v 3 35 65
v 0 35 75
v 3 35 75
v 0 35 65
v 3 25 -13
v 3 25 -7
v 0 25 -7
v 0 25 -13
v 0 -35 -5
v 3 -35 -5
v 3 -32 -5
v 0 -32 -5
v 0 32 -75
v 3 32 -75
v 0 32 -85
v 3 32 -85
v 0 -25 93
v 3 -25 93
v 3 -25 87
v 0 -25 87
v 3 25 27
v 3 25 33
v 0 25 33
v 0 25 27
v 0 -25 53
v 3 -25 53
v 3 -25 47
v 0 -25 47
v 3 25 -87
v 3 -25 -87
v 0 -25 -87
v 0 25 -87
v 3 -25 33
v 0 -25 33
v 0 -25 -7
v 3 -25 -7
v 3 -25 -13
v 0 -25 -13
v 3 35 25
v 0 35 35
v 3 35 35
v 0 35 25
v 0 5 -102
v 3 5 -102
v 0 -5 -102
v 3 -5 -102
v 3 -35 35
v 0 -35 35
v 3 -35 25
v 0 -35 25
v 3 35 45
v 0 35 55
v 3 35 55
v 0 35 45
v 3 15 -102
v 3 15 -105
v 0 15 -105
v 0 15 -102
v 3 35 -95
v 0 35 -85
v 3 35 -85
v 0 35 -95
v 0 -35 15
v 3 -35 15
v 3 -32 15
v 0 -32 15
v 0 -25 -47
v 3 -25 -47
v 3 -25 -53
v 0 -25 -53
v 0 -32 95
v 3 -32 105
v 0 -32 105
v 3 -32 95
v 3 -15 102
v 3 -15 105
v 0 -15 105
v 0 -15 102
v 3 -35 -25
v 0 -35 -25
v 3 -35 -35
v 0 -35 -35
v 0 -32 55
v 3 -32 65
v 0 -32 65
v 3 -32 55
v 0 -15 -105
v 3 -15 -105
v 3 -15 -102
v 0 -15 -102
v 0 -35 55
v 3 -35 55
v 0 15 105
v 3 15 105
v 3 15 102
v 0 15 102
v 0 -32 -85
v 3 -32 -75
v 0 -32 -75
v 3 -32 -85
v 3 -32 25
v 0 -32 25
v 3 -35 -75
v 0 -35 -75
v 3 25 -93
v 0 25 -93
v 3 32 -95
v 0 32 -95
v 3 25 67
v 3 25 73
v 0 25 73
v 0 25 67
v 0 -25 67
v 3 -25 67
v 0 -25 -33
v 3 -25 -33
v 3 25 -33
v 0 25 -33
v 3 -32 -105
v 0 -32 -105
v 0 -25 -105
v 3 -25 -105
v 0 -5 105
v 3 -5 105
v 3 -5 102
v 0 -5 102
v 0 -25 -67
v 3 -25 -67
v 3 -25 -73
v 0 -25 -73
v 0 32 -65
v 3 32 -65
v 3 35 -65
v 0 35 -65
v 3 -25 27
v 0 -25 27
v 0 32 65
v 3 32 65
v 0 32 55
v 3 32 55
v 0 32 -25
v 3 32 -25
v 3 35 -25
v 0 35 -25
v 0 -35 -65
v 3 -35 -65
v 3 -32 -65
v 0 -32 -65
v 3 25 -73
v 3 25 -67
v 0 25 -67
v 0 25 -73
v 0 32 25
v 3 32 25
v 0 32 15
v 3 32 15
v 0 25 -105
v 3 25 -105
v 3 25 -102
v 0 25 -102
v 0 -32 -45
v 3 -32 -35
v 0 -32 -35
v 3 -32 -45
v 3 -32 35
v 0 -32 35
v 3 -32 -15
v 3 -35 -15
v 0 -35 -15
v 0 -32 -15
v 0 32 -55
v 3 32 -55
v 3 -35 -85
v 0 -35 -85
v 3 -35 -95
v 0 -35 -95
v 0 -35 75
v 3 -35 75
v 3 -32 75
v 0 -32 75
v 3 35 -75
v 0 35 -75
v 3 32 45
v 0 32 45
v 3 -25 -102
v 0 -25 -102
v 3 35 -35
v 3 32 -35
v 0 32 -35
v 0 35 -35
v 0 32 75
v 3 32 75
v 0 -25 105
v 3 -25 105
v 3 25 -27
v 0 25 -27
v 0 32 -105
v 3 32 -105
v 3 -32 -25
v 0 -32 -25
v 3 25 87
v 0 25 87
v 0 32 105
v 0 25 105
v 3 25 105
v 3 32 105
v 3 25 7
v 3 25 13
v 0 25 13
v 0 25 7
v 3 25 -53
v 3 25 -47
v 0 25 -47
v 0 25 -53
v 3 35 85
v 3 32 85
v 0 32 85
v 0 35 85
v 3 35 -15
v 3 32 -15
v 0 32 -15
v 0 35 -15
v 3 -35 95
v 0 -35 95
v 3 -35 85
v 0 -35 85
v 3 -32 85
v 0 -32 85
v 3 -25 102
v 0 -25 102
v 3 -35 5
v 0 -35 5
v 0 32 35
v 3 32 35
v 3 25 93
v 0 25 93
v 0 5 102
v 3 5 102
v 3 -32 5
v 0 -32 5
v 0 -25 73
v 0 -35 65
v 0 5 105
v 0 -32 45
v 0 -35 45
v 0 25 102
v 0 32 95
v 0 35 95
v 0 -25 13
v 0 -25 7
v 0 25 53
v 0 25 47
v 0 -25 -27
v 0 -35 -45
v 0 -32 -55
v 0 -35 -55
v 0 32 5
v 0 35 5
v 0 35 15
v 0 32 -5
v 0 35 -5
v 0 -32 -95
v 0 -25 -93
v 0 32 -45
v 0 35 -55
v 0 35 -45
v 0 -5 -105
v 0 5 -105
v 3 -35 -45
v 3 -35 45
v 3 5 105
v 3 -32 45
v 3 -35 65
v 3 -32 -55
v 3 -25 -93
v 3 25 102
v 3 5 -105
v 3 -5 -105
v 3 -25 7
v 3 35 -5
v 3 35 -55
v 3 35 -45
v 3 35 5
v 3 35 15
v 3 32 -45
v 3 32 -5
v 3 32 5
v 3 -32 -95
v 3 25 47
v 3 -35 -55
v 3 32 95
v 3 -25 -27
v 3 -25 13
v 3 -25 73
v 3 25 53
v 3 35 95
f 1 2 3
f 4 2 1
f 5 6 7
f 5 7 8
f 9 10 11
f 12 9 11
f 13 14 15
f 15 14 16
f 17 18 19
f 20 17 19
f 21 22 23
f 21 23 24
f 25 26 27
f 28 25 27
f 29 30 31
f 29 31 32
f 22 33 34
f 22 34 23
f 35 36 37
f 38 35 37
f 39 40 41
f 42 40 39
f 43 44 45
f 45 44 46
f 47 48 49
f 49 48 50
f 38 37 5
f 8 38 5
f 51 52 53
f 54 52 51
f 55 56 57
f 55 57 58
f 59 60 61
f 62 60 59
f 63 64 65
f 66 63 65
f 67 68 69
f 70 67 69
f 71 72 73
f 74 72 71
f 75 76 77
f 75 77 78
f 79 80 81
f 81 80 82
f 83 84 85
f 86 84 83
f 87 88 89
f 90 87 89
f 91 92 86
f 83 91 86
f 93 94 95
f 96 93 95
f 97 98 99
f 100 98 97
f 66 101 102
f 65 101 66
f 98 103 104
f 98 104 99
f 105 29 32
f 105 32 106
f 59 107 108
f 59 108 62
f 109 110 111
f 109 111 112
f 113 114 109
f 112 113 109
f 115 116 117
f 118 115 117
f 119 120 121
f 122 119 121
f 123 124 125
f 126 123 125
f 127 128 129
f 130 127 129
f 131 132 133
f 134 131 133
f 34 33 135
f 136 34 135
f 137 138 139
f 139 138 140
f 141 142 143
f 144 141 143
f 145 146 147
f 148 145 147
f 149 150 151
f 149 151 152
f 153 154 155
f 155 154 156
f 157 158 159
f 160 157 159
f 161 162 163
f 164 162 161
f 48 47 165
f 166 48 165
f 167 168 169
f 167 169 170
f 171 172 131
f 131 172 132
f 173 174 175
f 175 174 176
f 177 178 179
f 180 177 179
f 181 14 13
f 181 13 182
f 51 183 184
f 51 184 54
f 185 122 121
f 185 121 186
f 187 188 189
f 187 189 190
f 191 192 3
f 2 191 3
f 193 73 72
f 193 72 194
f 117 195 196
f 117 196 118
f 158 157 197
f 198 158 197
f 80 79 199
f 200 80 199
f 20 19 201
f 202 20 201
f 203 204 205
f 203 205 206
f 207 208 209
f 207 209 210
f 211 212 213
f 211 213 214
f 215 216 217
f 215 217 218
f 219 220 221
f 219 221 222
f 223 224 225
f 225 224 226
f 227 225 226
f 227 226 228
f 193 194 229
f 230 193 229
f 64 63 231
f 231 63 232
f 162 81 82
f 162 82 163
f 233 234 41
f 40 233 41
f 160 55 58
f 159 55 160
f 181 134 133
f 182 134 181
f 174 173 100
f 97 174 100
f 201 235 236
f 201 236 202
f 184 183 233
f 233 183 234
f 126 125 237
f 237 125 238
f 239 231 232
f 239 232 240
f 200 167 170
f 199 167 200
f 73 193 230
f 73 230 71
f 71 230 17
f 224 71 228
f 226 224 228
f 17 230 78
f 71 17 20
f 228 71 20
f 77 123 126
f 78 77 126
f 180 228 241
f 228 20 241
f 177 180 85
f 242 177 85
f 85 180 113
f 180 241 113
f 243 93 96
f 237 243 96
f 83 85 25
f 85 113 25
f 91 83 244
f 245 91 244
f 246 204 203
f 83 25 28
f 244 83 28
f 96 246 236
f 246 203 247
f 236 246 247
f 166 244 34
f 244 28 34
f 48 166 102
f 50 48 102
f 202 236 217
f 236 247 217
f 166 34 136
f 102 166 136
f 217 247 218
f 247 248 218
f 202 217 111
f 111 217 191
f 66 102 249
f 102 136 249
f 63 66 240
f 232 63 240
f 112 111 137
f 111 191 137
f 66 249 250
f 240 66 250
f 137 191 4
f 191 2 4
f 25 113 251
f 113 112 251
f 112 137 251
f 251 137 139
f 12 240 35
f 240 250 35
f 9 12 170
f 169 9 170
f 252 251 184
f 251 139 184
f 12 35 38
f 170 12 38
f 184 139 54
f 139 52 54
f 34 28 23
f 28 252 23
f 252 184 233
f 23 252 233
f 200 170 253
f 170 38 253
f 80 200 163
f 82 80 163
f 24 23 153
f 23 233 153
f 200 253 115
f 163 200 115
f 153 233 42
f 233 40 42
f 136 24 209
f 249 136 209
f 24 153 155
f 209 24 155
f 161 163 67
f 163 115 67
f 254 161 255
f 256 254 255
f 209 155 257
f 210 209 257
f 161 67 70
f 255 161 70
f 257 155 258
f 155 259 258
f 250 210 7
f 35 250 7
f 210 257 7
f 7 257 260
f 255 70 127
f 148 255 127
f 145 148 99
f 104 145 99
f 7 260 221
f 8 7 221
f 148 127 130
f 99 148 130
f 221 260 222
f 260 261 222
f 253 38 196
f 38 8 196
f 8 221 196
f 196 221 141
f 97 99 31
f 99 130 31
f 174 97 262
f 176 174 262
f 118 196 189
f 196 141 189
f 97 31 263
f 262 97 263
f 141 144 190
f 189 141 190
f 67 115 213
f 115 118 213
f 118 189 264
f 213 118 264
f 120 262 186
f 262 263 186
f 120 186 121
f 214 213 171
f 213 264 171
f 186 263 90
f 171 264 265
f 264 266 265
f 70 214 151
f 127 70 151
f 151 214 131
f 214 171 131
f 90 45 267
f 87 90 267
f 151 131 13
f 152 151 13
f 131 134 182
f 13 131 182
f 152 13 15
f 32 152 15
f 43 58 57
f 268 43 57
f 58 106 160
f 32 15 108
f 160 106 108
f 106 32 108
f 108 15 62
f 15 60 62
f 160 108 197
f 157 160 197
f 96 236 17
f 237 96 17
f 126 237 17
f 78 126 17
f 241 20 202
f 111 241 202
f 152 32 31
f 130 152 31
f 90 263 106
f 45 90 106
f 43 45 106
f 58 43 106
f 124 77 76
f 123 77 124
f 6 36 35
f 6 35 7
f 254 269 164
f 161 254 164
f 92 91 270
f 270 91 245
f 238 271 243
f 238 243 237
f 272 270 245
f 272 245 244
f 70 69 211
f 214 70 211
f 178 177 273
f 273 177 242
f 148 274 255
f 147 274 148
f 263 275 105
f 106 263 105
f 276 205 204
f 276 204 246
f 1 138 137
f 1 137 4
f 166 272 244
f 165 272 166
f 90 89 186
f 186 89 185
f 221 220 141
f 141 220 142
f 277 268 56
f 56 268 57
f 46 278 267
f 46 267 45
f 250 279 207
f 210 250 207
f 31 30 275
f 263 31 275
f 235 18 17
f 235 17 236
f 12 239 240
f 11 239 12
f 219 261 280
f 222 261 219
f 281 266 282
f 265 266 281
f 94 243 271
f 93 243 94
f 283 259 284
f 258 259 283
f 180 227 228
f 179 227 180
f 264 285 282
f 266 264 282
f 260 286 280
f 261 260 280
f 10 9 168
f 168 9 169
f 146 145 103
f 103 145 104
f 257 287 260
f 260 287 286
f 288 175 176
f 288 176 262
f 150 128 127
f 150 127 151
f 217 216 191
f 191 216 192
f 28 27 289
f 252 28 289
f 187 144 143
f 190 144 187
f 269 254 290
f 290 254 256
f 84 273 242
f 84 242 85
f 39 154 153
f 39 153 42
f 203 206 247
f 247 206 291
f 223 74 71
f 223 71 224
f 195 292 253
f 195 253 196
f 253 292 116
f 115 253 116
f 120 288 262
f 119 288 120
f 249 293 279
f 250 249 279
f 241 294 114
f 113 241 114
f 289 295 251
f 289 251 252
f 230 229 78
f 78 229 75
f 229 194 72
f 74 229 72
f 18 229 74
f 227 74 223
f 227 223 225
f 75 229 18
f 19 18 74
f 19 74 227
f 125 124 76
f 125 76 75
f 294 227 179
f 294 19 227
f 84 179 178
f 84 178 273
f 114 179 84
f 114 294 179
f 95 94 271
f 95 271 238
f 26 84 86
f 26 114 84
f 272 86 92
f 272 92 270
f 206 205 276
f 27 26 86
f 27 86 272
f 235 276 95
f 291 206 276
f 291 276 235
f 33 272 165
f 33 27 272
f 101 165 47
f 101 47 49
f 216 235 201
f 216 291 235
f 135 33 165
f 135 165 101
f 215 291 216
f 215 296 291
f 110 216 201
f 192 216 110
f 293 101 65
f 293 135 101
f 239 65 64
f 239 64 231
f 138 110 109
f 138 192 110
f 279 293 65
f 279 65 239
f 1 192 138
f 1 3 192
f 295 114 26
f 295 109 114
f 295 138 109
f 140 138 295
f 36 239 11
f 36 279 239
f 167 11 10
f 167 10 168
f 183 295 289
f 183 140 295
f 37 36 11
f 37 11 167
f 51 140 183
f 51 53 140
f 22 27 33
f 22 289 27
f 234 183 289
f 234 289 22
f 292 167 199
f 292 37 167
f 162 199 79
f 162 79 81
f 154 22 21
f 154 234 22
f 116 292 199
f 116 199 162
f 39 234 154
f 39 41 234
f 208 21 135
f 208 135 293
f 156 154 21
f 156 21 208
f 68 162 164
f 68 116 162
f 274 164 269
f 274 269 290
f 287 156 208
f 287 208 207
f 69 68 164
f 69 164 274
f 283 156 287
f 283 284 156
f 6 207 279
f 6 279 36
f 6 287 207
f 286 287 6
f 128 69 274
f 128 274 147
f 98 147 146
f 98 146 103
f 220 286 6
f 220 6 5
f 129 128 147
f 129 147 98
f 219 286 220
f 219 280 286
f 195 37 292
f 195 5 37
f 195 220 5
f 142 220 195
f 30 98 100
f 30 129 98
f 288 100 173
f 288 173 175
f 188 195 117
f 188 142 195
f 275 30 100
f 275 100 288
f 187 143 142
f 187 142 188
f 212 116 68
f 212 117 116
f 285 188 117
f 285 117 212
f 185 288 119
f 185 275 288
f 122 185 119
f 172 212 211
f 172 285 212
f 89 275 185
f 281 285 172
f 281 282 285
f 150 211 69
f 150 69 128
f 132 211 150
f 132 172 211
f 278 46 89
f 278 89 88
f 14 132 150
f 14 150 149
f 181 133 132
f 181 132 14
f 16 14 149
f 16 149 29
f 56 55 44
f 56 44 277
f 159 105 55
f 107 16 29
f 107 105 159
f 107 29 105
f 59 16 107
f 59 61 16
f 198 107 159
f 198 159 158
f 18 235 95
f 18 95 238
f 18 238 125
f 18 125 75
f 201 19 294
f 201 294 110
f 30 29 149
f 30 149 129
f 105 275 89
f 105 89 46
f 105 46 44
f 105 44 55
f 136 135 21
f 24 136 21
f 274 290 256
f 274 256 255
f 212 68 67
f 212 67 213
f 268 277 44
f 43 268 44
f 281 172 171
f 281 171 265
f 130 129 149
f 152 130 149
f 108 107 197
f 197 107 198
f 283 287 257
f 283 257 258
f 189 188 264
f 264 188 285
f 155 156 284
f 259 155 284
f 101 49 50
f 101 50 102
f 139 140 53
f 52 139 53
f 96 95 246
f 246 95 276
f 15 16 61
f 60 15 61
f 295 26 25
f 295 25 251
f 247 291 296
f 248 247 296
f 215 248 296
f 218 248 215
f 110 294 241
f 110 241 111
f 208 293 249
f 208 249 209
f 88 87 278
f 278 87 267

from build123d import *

# Parameters (mm, degrees)
SKETCH1_W                = 210
SKETCH1_H                = 70
BOSS_EXTRUDE1_DEPTH      = 3
SKETCH2_W                = 10
SKETCH2_H                = 3
CUT_EXTRUDE1_DEPTH       = 3
LPATTERN1_COUNT          = 11
LPATTERN1_PITCH          = 20
MIRROR1_COPY_1_SKETCH_W  = 10
MIRROR1_COPY_1_SKETCH_H  = 3
MIRROR1_COPY_1_DEPTH     = 3
MIRROR1_COPY_2_SKETCH_W  = 10
MIRROR1_COPY_2_SKETCH_H  = 3
MIRROR1_COPY_2_DEPTH     = 3
MIRROR1_COPY_3_SKETCH_W  = 10
MIRROR1_COPY_3_SKETCH_H  = 3
MIRROR1_COPY_3_DEPTH     = 3
MIRROR1_COPY_4_SKETCH_W  = 10
MIRROR1_COPY_4_SKETCH_H  = 3
MIRROR1_COPY_4_DEPTH     = 3
MIRROR1_COPY_5_SKETCH_W  = 10
MIRROR1_COPY_5_SKETCH_H  = 3
MIRROR1_COPY_5_DEPTH     = 3
MIRROR1_COPY_6_SKETCH_W  = 10
MIRROR1_COPY_6_SKETCH_H  = 3
MIRROR1_COPY_6_DEPTH     = 3
MIRROR1_COPY_7_SKETCH_W  = 10
MIRROR1_COPY_7_SKETCH_H  = 3
MIRROR1_COPY_7_DEPTH     = 3
MIRROR1_COPY_8_SKETCH_W  = 10
MIRROR1_COPY_8_SKETCH_H  = 3
MIRROR1_COPY_8_DEPTH     = 3
MIRROR1_COPY_9_SKETCH_W  = 10
MIRROR1_COPY_9_SKETCH_H  = 3
MIRROR1_COPY_9_DEPTH     = 3
MIRROR1_COPY_10_SKETCH_W = 10
MIRROR1_COPY_10_SKETCH_H = 3
MIRROR1_COPY_10_DEPTH    = 3
SKETCH3_W                = 3
SKETCH3_H                = 10
CUT_EXTRUDE2_DEPTH       = 3
LPATTERN2_COUNT          = 3
LPATTERN2_PITCH          = 20
MIRROR2_COPY_1_SKETCH_W  = 3
MIRROR2_COPY_1_SKETCH_H  = 10
MIRROR2_COPY_1_DEPTH     = 3
MIRROR2_COPY_2_SKETCH_W  = 3
MIRROR2_COPY_2_SKETCH_H  = 10
MIRROR2_COPY_2_DEPTH     = 3
SKETCH4_W                = 6
SKETCH4_H                = 50
CUT_EXTRUDE3_DEPTH       = 3
LPATTERN3_COUNT          = 10
LPATTERN3_PITCH          = 20


with BuildPart() as part:
    # Sketch1 → Boss-Extrude1 (new body)
    with BuildSketch(Plane(origin=(0, 0, 0), x_dir=(0, 0, -1), z_dir=(1, 0, 0))):
        Rectangle(SKETCH1_W, SKETCH1_H)
    extrude(amount=BOSS_EXTRUDE1_DEPTH)

    # Sketch2 → Cut-Extrude1 (cut)
    with BuildSketch(Plane(origin=(3, 0, 0), x_dir=(0, 0, -1), z_dir=(1, 0, 0))):
        with Locations((-100, 33.5)):
            Rectangle(SKETCH2_W, SKETCH2_H)
    cut_extrude1 = extrude(amount=-CUT_EXTRUDE1_DEPTH, mode=Mode.SUBTRACT)

    # LPattern1: Cut-Extrude1 ×11
    with Locations(*[(0, 0, -i * LPATTERN1_PITCH) for i in range(1, LPATTERN1_COUNT)]):
        add(cut_extrude1, mode=Mode.SUBTRACT)

    # Mirror1: Cut-Extrude1 across plane
    add(cut_extrude1.mirror(Plane.ZX), mode=Mode.SUBTRACT)

    # Mirror1 copy 1 sketch → Mirror1 copy 1 (cut)
    with BuildSketch(Plane(origin=(3, 0, -20), x_dir=(0, 0, -1), z_dir=(1, 0, 0))):
        with Locations((-100, -33.5)):
            Rectangle(MIRROR1_COPY_1_SKETCH_W, MIRROR1_COPY_1_SKETCH_H)
    extrude(amount=-MIRROR1_COPY_1_DEPTH, mode=Mode.SUBTRACT)

    # Mirror1 copy 2 sketch → Mirror1 copy 2 (cut)
    with BuildSketch(Plane(origin=(3, 0, -40), x_dir=(0, 0, -1), z_dir=(1, 0, 0))):
        with Locations((-100, -33.5)):
            Rectangle(MIRROR1_COPY_2_SKETCH_W, MIRROR1_COPY_2_SKETCH_H)
    extrude(amount=-MIRROR1_COPY_2_DEPTH, mode=Mode.SUBTRACT)

    # Mirror1 copy 3 sketch → Mirror1 copy 3 (cut)
    with BuildSketch(Plane(origin=(3, 0, -60), x_dir=(0, 0, -1), z_dir=(1, 0, 0))):
        with Locations((-100, -33.5)):
            Rectangle(MIRROR1_COPY_3_SKETCH_W, MIRROR1_COPY_3_SKETCH_H)
    extrude(amount=-MIRROR1_COPY_3_DEPTH, mode=Mode.SUBTRACT)

    # Mirror1 copy 4 sketch → Mirror1 copy 4 (cut)
    with BuildSketch(Plane(origin=(3, 0, -80), x_dir=(0, 0, -1), z_dir=(1, 0, 0))):
        with Locations((-100, -33.5)):
            Rectangle(MIRROR1_COPY_4_SKETCH_W, MIRROR1_COPY_4_SKETCH_H)
    extrude(amount=-MIRROR1_COPY_4_DEPTH, mode=Mode.SUBTRACT)

    # Mirror1 copy 5 sketch → Mirror1 copy 5 (cut)
    with BuildSketch(Plane(origin=(3, 0, -100), x_dir=(0, 0, -1), z_dir=(1, 0, 0))):
        with Locations((-100, -33.5)):
            Rectangle(MIRROR1_COPY_5_SKETCH_W, MIRROR1_COPY_5_SKETCH_H)
    extrude(amount=-MIRROR1_COPY_5_DEPTH, mode=Mode.SUBTRACT)

    # Mirror1 copy 6 sketch → Mirror1 copy 6 (cut)
    with BuildSketch(Plane(origin=(3, 0, -120), x_dir=(0, 0, -1), z_dir=(1, 0, 0))):
        with Locations((-100, -33.5)):
            Rectangle(MIRROR1_COPY_6_SKETCH_W, MIRROR1_COPY_6_SKETCH_H)
    extrude(amount=-MIRROR1_COPY_6_DEPTH, mode=Mode.SUBTRACT)

    # Mirror1 copy 7 sketch → Mirror1 copy 7 (cut)
    with BuildSketch(Plane(origin=(3, 0, -140), x_dir=(0, 0, -1), z_dir=(1, 0, 0))):
        with Locations((-100, -33.5)):
            Rectangle(MIRROR1_COPY_7_SKETCH_W, MIRROR1_COPY_7_SKETCH_H)
    extrude(amount=-MIRROR1_COPY_7_DEPTH, mode=Mode.SUBTRACT)

    # Mirror1 copy 8 sketch → Mirror1 copy 8 (cut)
    with BuildSketch(Plane(origin=(3, 0, -160), x_dir=(0, 0, -1), z_dir=(1, 0, 0))):
        with Locations((-100, -33.5)):
            Rectangle(MIRROR1_COPY_8_SKETCH_W, MIRROR1_COPY_8_SKETCH_H)
    extrude(amount=-MIRROR1_COPY_8_DEPTH, mode=Mode.SUBTRACT)

    # Mirror1 copy 9 sketch → Mirror1 copy 9 (cut)
    with BuildSketch(Plane(origin=(3, 0, -180), x_dir=(0, 0, -1), z_dir=(1, 0, 0))):
        with Locations((-100, -33.5)):
            Rectangle(MIRROR1_COPY_9_SKETCH_W, MIRROR1_COPY_9_SKETCH_H)
    extrude(amount=-MIRROR1_COPY_9_DEPTH, mode=Mode.SUBTRACT)

    # Mirror1 copy 10 sketch → Mirror1 copy 10 (cut)
    with BuildSketch(Plane(origin=(3, 0, -200), x_dir=(0, 0, -1), z_dir=(1, 0, 0))):
        with Locations((-100, -33.5)):
            Rectangle(MIRROR1_COPY_10_SKETCH_W, MIRROR1_COPY_10_SKETCH_H)
    extrude(amount=-MIRROR1_COPY_10_DEPTH, mode=Mode.SUBTRACT)

    # Sketch3 → Cut-Extrude2 (cut)
    with BuildSketch(Plane(origin=(3, 0, 0), x_dir=(0, 0, -1), z_dir=(1, 0, 0))):
        with Locations((-103.5, 20)):
            Rectangle(SKETCH3_W, SKETCH3_H)
    cut_extrude2 = extrude(amount=-CUT_EXTRUDE2_DEPTH, mode=Mode.SUBTRACT)

    # LPattern2: Cut-Extrude2 ×3
    with Locations(*[(0, -i * LPATTERN2_PITCH, 0) for i in range(1, LPATTERN2_COUNT)]):
        add(cut_extrude2, mode=Mode.SUBTRACT)

    # Mirror2: Cut-Extrude2 across plane
    add(cut_extrude2.mirror(Plane.XY), mode=Mode.SUBTRACT)

    # Mirror2 copy 1 sketch → Mirror2 copy 1 (cut)
    with BuildSketch(Plane(origin=(3, -20, 0), x_dir=(0, 0, 1), z_dir=(1, 0, 0))):
        with Locations((-103.5, -20)):
            Rectangle(MIRROR2_COPY_1_SKETCH_W, MIRROR2_COPY_1_SKETCH_H)
    extrude(amount=-MIRROR2_COPY_1_DEPTH, mode=Mode.SUBTRACT)

    # Mirror2 copy 2 sketch → Mirror2 copy 2 (cut)
    with BuildSketch(Plane(origin=(3, -40, 0), x_dir=(0, 0, 1), z_dir=(1, 0, 0))):
        with Locations((-103.5, -20)):
            Rectangle(MIRROR2_COPY_2_SKETCH_W, MIRROR2_COPY_2_SKETCH_H)
    extrude(amount=-MIRROR2_COPY_2_DEPTH, mode=Mode.SUBTRACT)

    # Sketch4 → Cut-Extrude3 (cut)
    with BuildSketch(Plane(origin=(3, 0, 0), x_dir=(0, 0, -1), z_dir=(1, 0, 0))):
        with Locations((-90, 0)):
            Rectangle(SKETCH4_W, SKETCH4_H)
    cut_extrude3 = extrude(amount=-CUT_EXTRUDE3_DEPTH, mode=Mode.SUBTRACT)

    # LPattern3: Cut-Extrude3 ×10
    with Locations(*[(0, 0, -i * LPATTERN3_PITCH) for i in range(1, LPATTERN3_COUNT)]):
        add(cut_extrude3, mode=Mode.SUBTRACT)


solid = part.part
